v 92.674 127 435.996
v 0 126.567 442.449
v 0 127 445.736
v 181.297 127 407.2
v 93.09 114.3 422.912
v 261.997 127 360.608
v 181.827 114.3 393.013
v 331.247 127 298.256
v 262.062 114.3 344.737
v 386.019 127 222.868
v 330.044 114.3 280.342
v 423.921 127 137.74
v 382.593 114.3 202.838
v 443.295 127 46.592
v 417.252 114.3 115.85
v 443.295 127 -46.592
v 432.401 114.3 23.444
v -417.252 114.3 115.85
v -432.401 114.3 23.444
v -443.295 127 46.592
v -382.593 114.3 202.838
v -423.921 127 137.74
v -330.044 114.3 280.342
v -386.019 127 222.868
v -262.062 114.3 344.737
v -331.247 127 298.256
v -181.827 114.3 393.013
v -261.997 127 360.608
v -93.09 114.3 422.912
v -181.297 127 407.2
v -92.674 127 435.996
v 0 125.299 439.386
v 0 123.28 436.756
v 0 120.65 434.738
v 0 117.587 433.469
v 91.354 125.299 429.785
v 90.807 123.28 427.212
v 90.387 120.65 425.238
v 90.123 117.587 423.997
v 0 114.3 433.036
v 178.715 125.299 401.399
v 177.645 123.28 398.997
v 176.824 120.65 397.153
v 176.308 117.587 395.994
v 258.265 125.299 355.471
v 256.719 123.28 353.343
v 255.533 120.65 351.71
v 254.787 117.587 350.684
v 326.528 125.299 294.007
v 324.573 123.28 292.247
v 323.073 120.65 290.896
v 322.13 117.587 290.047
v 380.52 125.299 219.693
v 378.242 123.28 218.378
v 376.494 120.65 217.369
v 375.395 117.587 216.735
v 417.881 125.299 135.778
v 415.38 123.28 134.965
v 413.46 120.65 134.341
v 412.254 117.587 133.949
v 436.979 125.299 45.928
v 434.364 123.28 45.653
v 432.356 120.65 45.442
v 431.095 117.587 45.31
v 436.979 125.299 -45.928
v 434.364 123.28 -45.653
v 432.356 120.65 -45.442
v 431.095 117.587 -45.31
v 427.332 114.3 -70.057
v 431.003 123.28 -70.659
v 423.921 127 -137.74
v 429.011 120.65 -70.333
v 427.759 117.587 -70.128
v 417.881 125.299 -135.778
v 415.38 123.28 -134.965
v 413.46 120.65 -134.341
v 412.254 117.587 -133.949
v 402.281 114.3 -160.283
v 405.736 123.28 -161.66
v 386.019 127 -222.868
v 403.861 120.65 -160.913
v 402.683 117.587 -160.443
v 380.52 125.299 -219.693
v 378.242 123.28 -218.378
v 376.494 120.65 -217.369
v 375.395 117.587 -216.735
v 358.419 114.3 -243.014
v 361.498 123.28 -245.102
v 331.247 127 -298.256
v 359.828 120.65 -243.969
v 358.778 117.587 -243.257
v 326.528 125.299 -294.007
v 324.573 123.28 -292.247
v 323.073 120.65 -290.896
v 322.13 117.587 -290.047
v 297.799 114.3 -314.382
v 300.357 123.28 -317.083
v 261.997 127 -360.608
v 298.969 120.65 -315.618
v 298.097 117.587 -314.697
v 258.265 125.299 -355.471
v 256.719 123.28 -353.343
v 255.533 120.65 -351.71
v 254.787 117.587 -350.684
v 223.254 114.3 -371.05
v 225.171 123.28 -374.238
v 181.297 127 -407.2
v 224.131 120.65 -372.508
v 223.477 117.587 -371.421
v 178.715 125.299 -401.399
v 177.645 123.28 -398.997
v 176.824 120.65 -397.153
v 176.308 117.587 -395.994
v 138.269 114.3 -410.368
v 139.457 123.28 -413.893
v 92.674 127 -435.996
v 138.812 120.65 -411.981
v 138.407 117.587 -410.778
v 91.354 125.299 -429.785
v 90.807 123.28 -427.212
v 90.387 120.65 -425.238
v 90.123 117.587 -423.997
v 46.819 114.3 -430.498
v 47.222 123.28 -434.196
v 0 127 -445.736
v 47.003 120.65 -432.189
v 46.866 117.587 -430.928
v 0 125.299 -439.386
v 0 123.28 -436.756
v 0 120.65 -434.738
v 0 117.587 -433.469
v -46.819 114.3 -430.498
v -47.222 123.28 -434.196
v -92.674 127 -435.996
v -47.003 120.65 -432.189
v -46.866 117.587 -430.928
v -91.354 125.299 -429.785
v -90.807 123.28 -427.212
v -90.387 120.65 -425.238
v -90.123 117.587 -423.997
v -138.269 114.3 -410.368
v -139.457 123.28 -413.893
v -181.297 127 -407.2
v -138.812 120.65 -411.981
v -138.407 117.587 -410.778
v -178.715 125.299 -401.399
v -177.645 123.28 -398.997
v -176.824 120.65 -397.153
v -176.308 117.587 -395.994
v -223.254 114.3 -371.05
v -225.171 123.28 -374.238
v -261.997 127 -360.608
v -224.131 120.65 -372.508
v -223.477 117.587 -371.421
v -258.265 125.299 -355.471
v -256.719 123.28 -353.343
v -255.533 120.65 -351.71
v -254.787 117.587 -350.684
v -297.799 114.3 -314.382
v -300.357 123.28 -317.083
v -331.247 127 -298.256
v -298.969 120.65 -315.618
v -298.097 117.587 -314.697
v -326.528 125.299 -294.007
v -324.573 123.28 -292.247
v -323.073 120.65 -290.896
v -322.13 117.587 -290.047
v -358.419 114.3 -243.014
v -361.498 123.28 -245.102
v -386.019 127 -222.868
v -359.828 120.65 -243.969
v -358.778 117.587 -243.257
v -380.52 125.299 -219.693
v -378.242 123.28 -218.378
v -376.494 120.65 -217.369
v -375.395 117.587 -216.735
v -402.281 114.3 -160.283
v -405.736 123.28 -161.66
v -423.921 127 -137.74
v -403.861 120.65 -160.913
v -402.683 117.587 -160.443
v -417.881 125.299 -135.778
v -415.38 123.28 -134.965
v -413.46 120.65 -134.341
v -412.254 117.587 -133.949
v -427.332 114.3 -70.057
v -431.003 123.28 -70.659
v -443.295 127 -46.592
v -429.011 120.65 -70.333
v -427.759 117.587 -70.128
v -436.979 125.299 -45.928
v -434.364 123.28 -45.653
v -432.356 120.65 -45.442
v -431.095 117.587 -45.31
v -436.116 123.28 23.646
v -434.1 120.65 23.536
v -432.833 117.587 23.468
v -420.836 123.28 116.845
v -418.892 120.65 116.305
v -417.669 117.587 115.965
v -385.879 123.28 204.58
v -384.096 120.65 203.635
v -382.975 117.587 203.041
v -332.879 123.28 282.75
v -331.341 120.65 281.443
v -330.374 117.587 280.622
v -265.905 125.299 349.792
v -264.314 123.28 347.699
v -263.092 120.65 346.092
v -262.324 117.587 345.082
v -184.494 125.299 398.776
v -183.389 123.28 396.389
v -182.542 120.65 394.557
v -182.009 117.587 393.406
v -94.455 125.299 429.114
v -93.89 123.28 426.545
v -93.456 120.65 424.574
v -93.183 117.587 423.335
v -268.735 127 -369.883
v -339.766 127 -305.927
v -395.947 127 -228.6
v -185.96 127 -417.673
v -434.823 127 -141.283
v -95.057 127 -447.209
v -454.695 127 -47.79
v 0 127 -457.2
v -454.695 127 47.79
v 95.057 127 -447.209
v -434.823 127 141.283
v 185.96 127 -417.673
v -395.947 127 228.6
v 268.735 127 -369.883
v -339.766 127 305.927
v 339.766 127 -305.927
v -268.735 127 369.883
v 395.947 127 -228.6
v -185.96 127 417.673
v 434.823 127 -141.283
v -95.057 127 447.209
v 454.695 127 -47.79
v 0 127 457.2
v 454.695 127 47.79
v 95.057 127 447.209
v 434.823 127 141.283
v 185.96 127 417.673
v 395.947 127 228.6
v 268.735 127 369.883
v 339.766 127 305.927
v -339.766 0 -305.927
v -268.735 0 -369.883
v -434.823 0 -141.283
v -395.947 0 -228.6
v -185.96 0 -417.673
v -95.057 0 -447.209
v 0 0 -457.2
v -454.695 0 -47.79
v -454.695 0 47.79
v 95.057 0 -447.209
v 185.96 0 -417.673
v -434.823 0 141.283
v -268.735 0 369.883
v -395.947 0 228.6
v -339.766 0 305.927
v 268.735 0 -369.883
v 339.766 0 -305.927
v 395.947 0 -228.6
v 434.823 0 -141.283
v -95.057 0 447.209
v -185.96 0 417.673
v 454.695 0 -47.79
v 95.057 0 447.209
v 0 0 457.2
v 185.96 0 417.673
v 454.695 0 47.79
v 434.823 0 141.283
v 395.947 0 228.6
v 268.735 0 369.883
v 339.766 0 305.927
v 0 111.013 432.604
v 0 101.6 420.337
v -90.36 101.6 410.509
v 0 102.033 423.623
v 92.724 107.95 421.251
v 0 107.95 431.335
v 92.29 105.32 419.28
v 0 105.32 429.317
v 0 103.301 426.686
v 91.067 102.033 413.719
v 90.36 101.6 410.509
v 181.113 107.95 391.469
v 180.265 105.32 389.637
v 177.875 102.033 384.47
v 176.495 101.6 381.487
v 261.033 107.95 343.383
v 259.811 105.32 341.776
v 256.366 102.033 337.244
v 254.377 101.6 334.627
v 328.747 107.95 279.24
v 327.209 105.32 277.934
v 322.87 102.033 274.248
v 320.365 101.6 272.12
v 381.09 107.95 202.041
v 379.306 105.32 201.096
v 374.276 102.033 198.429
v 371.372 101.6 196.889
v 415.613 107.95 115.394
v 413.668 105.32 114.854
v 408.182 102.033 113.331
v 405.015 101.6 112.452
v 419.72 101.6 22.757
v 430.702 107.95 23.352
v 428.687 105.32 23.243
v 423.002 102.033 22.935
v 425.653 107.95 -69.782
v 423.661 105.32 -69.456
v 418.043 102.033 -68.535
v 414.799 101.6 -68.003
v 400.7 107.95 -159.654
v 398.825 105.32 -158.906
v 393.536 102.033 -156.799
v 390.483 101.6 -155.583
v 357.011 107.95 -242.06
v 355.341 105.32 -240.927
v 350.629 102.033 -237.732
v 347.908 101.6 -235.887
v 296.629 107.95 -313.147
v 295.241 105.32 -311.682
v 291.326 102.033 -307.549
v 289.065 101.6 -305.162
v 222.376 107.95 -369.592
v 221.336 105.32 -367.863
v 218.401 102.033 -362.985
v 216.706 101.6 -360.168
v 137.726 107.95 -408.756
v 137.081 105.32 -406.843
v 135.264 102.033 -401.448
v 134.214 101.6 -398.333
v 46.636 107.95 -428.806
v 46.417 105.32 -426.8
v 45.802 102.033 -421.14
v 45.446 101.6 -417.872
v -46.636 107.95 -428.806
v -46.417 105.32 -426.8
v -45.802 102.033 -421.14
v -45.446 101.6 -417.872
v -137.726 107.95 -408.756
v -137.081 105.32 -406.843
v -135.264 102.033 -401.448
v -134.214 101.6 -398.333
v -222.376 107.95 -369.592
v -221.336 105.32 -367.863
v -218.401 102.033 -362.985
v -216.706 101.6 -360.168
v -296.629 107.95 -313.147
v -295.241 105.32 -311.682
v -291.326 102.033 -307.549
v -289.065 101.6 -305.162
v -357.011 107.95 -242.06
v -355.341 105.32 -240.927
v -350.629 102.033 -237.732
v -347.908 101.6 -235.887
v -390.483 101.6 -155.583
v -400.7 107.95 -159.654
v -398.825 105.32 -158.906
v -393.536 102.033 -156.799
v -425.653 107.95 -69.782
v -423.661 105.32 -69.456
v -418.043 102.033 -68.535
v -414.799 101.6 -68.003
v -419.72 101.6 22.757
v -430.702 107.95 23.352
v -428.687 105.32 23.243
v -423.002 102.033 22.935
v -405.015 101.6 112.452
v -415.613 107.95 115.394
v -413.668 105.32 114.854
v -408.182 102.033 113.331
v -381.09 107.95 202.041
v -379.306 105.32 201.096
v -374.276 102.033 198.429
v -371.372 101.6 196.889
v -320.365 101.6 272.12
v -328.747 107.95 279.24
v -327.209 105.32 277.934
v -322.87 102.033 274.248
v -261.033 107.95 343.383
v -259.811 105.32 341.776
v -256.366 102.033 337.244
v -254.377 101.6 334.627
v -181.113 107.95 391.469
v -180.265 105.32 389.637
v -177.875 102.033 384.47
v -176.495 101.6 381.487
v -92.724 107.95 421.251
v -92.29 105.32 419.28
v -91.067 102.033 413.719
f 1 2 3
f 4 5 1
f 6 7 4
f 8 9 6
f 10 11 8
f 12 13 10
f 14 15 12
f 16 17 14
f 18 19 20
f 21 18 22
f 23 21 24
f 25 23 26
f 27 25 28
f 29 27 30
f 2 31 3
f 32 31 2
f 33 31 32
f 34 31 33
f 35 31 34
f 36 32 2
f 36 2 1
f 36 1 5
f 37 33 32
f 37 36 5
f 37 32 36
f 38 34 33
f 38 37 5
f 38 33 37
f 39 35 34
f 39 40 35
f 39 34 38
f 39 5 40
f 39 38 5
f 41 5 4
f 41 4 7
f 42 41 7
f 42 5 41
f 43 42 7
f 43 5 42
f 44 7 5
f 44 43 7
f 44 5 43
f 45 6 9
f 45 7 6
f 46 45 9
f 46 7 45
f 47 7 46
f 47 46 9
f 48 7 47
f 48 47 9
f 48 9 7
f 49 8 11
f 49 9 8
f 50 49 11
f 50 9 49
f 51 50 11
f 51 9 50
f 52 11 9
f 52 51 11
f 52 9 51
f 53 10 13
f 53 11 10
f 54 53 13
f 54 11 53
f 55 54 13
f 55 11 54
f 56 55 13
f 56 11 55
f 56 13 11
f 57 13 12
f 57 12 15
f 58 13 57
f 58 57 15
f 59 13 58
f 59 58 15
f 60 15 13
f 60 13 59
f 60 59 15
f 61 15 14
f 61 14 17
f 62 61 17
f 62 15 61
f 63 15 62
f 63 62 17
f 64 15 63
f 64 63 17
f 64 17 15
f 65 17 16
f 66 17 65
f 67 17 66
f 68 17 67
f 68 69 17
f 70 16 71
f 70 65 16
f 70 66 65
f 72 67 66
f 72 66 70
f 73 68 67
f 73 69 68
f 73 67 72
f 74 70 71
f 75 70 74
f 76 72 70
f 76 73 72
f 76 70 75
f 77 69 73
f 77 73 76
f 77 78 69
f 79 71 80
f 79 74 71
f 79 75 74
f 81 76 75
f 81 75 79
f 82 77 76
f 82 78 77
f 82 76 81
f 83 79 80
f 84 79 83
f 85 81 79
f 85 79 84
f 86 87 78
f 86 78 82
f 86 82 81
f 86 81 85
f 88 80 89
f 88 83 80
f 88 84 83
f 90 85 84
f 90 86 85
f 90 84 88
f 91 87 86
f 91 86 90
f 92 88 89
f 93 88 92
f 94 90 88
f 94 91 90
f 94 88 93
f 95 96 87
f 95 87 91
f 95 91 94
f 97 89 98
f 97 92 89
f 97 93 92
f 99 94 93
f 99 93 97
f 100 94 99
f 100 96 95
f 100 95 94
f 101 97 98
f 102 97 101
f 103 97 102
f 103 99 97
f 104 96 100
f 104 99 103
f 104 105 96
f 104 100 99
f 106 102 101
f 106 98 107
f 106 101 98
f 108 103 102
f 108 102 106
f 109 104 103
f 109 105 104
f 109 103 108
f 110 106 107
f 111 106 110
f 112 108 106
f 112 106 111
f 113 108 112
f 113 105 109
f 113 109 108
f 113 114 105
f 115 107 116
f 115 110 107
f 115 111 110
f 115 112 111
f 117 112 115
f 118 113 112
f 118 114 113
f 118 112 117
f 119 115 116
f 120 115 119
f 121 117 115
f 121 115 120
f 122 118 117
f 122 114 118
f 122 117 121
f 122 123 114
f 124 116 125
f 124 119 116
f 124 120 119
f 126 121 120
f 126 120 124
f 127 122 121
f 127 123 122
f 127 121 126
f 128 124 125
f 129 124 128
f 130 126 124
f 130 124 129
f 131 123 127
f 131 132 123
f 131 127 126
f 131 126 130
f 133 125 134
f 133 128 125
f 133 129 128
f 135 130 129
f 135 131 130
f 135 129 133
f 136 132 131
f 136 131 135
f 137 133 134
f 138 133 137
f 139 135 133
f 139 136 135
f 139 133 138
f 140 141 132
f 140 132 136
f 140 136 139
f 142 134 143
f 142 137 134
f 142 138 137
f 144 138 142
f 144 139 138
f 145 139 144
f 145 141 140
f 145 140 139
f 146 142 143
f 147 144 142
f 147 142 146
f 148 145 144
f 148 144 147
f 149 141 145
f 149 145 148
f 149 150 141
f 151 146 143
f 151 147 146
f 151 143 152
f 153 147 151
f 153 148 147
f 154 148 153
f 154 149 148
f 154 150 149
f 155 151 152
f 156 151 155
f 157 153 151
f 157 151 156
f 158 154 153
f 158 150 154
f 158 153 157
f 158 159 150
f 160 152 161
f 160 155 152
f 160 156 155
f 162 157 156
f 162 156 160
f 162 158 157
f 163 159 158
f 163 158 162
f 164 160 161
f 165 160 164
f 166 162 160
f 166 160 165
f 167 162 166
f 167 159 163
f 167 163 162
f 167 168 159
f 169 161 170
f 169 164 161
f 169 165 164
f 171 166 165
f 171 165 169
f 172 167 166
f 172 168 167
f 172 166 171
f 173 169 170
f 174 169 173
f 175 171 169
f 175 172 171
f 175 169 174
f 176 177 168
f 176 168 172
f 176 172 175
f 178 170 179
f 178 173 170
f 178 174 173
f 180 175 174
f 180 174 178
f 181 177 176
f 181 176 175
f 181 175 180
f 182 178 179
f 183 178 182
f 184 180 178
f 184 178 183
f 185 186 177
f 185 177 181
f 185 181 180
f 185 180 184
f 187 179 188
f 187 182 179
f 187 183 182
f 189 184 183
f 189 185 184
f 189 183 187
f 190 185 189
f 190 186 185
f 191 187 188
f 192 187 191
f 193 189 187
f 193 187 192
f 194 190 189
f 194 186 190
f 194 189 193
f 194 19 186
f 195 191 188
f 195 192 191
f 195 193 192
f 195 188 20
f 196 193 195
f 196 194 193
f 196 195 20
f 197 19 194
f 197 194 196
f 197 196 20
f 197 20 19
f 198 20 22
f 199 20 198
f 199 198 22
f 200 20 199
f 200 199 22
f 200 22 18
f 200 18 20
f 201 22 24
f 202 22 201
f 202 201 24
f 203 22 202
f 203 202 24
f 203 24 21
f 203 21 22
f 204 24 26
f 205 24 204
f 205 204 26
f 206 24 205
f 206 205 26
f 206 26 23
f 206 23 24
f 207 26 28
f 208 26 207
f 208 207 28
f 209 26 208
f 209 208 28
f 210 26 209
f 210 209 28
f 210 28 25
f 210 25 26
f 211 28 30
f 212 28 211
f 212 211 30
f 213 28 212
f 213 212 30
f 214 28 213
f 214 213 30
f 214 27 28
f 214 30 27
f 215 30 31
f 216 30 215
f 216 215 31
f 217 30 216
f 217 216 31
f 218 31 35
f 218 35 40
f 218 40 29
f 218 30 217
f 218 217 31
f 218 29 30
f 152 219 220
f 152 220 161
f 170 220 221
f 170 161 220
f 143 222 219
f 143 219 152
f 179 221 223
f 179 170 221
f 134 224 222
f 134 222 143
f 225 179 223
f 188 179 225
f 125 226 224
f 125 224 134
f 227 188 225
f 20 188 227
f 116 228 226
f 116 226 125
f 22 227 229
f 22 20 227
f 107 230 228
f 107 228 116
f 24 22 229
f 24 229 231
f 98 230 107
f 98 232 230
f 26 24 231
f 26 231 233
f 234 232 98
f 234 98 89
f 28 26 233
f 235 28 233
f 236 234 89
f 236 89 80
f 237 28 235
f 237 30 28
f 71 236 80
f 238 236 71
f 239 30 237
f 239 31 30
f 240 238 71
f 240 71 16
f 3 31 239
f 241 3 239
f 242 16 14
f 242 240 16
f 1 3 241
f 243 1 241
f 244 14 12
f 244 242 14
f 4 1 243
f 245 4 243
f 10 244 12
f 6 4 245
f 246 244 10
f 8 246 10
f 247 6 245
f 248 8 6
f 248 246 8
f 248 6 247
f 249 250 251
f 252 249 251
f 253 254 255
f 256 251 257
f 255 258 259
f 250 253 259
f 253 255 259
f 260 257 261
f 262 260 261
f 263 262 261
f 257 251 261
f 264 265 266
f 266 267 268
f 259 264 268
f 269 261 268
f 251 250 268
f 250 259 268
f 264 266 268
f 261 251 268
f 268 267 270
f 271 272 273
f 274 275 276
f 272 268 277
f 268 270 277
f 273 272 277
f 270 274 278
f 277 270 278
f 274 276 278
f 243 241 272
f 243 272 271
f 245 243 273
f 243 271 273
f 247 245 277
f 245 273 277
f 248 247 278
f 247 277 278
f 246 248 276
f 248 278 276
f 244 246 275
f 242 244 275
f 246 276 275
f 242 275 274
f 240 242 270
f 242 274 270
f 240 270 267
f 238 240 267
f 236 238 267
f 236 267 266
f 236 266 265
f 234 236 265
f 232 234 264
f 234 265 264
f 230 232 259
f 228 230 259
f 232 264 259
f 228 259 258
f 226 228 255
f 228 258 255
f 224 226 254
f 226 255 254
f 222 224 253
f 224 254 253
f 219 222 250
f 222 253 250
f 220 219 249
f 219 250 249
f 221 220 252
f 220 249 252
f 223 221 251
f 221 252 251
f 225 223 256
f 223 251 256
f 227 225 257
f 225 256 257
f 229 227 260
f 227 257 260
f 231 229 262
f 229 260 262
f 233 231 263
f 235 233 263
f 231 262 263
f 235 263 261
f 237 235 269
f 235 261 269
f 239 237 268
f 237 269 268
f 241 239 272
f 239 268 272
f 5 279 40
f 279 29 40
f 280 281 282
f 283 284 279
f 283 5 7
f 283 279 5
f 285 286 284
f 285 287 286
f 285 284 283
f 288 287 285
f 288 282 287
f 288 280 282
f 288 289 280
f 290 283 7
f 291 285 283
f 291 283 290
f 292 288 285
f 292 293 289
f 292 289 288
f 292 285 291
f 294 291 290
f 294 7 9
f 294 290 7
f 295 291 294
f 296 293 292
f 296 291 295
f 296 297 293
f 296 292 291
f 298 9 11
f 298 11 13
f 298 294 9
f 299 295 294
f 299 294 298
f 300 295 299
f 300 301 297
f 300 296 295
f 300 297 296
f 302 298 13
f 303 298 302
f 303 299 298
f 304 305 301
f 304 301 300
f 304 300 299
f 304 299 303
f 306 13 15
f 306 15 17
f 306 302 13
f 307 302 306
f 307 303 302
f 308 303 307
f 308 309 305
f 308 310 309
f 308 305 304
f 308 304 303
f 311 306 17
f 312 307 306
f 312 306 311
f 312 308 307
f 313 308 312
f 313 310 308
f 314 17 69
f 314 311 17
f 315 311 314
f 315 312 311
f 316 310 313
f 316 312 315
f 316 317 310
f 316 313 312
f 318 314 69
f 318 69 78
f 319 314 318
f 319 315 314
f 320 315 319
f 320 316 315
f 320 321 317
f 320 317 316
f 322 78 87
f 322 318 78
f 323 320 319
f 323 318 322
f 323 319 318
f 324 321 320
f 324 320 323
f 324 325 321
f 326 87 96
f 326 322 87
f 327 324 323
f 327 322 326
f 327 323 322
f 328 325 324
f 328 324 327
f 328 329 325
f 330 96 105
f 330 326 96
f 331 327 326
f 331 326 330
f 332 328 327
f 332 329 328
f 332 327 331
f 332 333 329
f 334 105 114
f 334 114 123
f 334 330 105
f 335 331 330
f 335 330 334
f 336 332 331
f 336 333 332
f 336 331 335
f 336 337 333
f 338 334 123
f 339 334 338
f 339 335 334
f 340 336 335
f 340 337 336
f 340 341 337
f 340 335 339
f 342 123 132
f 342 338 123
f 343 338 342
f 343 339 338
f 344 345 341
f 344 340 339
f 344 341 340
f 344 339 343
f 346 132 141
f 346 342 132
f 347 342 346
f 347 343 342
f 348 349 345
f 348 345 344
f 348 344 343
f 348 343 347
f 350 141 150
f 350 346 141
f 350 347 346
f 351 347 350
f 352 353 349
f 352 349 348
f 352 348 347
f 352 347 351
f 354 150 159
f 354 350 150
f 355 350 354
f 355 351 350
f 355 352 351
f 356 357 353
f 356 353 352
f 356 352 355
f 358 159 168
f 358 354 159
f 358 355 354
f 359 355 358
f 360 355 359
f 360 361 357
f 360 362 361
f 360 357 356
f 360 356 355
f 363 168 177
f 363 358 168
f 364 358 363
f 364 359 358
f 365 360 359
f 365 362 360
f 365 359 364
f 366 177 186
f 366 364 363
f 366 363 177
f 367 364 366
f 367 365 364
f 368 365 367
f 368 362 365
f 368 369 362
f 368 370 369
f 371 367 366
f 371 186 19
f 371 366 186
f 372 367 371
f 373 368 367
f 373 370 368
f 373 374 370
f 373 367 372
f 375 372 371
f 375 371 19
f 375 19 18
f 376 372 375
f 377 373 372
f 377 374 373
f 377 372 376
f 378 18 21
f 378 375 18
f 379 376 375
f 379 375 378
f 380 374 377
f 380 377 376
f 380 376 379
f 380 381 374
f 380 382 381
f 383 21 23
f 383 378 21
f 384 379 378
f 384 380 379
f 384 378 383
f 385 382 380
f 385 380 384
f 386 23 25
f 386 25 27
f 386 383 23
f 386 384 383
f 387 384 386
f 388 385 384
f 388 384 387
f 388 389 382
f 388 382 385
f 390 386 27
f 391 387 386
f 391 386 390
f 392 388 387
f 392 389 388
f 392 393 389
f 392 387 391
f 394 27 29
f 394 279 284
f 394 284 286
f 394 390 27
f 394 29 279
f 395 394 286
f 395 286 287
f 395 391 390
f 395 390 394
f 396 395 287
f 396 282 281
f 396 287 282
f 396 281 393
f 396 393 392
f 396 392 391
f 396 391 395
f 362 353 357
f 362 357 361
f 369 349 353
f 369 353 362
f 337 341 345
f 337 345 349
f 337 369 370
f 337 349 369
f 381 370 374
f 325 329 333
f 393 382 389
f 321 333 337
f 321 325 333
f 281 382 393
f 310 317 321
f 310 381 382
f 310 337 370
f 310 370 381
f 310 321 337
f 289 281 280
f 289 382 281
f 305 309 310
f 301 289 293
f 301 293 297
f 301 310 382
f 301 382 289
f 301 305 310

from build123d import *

# Parameters (mm, degrees)
SKETCH1_R           = 457.2
BOSS_EXTRUDE1_DEPTH = 127
SKETCH2_R           = 433.036421312
CUT_EXTRUDE2_DEPTH  = 25.4
FILLET3_R           = 12.7
FILLET4_R           = 12.7


with BuildPart() as part:
    # Sketch1 → Boss-Extrude1 (new body)
    with BuildSketch(Plane(origin=(0, 0, 0), x_dir=(1, 0, 0), z_dir=(0, 1, 0))):
        with Locations(Location((0, 0, 0), (0, 0, 270))):
            Circle(SKETCH1_R)
    extrude(amount=BOSS_EXTRUDE1_DEPTH)

    # Sketch2 → Cut-Extrude2 (cut)
    with BuildSketch(Plane(origin=(0, 127, 0), x_dir=(1, 0, 0), z_dir=(0, 1, 0))):
        with Locations(Location((0, 0, 0), (0, 0, 270))):
            Circle(SKETCH2_R)
    extrude(amount=-CUT_EXTRUDE2_DEPTH, mode=Mode.SUBTRACT)

    # Fillet3
    fillet3_edges = [part.edges().sort_by_distance(p)[0] for p in [
        (0, 127, -433.036421312),
    ]]
    fillet(fillet3_edges, radius=FILLET3_R)

    # Fillet4
    fillet4_edges = [part.edges().sort_by_distance(p)[0] for p in [
        (0, 101.6, -433.036421312),
    ]]
    fillet(fillet4_edges, radius=FILLET4_R - 0.0001)  # a hair under: the kernel refuses the full size


solid = part.part
